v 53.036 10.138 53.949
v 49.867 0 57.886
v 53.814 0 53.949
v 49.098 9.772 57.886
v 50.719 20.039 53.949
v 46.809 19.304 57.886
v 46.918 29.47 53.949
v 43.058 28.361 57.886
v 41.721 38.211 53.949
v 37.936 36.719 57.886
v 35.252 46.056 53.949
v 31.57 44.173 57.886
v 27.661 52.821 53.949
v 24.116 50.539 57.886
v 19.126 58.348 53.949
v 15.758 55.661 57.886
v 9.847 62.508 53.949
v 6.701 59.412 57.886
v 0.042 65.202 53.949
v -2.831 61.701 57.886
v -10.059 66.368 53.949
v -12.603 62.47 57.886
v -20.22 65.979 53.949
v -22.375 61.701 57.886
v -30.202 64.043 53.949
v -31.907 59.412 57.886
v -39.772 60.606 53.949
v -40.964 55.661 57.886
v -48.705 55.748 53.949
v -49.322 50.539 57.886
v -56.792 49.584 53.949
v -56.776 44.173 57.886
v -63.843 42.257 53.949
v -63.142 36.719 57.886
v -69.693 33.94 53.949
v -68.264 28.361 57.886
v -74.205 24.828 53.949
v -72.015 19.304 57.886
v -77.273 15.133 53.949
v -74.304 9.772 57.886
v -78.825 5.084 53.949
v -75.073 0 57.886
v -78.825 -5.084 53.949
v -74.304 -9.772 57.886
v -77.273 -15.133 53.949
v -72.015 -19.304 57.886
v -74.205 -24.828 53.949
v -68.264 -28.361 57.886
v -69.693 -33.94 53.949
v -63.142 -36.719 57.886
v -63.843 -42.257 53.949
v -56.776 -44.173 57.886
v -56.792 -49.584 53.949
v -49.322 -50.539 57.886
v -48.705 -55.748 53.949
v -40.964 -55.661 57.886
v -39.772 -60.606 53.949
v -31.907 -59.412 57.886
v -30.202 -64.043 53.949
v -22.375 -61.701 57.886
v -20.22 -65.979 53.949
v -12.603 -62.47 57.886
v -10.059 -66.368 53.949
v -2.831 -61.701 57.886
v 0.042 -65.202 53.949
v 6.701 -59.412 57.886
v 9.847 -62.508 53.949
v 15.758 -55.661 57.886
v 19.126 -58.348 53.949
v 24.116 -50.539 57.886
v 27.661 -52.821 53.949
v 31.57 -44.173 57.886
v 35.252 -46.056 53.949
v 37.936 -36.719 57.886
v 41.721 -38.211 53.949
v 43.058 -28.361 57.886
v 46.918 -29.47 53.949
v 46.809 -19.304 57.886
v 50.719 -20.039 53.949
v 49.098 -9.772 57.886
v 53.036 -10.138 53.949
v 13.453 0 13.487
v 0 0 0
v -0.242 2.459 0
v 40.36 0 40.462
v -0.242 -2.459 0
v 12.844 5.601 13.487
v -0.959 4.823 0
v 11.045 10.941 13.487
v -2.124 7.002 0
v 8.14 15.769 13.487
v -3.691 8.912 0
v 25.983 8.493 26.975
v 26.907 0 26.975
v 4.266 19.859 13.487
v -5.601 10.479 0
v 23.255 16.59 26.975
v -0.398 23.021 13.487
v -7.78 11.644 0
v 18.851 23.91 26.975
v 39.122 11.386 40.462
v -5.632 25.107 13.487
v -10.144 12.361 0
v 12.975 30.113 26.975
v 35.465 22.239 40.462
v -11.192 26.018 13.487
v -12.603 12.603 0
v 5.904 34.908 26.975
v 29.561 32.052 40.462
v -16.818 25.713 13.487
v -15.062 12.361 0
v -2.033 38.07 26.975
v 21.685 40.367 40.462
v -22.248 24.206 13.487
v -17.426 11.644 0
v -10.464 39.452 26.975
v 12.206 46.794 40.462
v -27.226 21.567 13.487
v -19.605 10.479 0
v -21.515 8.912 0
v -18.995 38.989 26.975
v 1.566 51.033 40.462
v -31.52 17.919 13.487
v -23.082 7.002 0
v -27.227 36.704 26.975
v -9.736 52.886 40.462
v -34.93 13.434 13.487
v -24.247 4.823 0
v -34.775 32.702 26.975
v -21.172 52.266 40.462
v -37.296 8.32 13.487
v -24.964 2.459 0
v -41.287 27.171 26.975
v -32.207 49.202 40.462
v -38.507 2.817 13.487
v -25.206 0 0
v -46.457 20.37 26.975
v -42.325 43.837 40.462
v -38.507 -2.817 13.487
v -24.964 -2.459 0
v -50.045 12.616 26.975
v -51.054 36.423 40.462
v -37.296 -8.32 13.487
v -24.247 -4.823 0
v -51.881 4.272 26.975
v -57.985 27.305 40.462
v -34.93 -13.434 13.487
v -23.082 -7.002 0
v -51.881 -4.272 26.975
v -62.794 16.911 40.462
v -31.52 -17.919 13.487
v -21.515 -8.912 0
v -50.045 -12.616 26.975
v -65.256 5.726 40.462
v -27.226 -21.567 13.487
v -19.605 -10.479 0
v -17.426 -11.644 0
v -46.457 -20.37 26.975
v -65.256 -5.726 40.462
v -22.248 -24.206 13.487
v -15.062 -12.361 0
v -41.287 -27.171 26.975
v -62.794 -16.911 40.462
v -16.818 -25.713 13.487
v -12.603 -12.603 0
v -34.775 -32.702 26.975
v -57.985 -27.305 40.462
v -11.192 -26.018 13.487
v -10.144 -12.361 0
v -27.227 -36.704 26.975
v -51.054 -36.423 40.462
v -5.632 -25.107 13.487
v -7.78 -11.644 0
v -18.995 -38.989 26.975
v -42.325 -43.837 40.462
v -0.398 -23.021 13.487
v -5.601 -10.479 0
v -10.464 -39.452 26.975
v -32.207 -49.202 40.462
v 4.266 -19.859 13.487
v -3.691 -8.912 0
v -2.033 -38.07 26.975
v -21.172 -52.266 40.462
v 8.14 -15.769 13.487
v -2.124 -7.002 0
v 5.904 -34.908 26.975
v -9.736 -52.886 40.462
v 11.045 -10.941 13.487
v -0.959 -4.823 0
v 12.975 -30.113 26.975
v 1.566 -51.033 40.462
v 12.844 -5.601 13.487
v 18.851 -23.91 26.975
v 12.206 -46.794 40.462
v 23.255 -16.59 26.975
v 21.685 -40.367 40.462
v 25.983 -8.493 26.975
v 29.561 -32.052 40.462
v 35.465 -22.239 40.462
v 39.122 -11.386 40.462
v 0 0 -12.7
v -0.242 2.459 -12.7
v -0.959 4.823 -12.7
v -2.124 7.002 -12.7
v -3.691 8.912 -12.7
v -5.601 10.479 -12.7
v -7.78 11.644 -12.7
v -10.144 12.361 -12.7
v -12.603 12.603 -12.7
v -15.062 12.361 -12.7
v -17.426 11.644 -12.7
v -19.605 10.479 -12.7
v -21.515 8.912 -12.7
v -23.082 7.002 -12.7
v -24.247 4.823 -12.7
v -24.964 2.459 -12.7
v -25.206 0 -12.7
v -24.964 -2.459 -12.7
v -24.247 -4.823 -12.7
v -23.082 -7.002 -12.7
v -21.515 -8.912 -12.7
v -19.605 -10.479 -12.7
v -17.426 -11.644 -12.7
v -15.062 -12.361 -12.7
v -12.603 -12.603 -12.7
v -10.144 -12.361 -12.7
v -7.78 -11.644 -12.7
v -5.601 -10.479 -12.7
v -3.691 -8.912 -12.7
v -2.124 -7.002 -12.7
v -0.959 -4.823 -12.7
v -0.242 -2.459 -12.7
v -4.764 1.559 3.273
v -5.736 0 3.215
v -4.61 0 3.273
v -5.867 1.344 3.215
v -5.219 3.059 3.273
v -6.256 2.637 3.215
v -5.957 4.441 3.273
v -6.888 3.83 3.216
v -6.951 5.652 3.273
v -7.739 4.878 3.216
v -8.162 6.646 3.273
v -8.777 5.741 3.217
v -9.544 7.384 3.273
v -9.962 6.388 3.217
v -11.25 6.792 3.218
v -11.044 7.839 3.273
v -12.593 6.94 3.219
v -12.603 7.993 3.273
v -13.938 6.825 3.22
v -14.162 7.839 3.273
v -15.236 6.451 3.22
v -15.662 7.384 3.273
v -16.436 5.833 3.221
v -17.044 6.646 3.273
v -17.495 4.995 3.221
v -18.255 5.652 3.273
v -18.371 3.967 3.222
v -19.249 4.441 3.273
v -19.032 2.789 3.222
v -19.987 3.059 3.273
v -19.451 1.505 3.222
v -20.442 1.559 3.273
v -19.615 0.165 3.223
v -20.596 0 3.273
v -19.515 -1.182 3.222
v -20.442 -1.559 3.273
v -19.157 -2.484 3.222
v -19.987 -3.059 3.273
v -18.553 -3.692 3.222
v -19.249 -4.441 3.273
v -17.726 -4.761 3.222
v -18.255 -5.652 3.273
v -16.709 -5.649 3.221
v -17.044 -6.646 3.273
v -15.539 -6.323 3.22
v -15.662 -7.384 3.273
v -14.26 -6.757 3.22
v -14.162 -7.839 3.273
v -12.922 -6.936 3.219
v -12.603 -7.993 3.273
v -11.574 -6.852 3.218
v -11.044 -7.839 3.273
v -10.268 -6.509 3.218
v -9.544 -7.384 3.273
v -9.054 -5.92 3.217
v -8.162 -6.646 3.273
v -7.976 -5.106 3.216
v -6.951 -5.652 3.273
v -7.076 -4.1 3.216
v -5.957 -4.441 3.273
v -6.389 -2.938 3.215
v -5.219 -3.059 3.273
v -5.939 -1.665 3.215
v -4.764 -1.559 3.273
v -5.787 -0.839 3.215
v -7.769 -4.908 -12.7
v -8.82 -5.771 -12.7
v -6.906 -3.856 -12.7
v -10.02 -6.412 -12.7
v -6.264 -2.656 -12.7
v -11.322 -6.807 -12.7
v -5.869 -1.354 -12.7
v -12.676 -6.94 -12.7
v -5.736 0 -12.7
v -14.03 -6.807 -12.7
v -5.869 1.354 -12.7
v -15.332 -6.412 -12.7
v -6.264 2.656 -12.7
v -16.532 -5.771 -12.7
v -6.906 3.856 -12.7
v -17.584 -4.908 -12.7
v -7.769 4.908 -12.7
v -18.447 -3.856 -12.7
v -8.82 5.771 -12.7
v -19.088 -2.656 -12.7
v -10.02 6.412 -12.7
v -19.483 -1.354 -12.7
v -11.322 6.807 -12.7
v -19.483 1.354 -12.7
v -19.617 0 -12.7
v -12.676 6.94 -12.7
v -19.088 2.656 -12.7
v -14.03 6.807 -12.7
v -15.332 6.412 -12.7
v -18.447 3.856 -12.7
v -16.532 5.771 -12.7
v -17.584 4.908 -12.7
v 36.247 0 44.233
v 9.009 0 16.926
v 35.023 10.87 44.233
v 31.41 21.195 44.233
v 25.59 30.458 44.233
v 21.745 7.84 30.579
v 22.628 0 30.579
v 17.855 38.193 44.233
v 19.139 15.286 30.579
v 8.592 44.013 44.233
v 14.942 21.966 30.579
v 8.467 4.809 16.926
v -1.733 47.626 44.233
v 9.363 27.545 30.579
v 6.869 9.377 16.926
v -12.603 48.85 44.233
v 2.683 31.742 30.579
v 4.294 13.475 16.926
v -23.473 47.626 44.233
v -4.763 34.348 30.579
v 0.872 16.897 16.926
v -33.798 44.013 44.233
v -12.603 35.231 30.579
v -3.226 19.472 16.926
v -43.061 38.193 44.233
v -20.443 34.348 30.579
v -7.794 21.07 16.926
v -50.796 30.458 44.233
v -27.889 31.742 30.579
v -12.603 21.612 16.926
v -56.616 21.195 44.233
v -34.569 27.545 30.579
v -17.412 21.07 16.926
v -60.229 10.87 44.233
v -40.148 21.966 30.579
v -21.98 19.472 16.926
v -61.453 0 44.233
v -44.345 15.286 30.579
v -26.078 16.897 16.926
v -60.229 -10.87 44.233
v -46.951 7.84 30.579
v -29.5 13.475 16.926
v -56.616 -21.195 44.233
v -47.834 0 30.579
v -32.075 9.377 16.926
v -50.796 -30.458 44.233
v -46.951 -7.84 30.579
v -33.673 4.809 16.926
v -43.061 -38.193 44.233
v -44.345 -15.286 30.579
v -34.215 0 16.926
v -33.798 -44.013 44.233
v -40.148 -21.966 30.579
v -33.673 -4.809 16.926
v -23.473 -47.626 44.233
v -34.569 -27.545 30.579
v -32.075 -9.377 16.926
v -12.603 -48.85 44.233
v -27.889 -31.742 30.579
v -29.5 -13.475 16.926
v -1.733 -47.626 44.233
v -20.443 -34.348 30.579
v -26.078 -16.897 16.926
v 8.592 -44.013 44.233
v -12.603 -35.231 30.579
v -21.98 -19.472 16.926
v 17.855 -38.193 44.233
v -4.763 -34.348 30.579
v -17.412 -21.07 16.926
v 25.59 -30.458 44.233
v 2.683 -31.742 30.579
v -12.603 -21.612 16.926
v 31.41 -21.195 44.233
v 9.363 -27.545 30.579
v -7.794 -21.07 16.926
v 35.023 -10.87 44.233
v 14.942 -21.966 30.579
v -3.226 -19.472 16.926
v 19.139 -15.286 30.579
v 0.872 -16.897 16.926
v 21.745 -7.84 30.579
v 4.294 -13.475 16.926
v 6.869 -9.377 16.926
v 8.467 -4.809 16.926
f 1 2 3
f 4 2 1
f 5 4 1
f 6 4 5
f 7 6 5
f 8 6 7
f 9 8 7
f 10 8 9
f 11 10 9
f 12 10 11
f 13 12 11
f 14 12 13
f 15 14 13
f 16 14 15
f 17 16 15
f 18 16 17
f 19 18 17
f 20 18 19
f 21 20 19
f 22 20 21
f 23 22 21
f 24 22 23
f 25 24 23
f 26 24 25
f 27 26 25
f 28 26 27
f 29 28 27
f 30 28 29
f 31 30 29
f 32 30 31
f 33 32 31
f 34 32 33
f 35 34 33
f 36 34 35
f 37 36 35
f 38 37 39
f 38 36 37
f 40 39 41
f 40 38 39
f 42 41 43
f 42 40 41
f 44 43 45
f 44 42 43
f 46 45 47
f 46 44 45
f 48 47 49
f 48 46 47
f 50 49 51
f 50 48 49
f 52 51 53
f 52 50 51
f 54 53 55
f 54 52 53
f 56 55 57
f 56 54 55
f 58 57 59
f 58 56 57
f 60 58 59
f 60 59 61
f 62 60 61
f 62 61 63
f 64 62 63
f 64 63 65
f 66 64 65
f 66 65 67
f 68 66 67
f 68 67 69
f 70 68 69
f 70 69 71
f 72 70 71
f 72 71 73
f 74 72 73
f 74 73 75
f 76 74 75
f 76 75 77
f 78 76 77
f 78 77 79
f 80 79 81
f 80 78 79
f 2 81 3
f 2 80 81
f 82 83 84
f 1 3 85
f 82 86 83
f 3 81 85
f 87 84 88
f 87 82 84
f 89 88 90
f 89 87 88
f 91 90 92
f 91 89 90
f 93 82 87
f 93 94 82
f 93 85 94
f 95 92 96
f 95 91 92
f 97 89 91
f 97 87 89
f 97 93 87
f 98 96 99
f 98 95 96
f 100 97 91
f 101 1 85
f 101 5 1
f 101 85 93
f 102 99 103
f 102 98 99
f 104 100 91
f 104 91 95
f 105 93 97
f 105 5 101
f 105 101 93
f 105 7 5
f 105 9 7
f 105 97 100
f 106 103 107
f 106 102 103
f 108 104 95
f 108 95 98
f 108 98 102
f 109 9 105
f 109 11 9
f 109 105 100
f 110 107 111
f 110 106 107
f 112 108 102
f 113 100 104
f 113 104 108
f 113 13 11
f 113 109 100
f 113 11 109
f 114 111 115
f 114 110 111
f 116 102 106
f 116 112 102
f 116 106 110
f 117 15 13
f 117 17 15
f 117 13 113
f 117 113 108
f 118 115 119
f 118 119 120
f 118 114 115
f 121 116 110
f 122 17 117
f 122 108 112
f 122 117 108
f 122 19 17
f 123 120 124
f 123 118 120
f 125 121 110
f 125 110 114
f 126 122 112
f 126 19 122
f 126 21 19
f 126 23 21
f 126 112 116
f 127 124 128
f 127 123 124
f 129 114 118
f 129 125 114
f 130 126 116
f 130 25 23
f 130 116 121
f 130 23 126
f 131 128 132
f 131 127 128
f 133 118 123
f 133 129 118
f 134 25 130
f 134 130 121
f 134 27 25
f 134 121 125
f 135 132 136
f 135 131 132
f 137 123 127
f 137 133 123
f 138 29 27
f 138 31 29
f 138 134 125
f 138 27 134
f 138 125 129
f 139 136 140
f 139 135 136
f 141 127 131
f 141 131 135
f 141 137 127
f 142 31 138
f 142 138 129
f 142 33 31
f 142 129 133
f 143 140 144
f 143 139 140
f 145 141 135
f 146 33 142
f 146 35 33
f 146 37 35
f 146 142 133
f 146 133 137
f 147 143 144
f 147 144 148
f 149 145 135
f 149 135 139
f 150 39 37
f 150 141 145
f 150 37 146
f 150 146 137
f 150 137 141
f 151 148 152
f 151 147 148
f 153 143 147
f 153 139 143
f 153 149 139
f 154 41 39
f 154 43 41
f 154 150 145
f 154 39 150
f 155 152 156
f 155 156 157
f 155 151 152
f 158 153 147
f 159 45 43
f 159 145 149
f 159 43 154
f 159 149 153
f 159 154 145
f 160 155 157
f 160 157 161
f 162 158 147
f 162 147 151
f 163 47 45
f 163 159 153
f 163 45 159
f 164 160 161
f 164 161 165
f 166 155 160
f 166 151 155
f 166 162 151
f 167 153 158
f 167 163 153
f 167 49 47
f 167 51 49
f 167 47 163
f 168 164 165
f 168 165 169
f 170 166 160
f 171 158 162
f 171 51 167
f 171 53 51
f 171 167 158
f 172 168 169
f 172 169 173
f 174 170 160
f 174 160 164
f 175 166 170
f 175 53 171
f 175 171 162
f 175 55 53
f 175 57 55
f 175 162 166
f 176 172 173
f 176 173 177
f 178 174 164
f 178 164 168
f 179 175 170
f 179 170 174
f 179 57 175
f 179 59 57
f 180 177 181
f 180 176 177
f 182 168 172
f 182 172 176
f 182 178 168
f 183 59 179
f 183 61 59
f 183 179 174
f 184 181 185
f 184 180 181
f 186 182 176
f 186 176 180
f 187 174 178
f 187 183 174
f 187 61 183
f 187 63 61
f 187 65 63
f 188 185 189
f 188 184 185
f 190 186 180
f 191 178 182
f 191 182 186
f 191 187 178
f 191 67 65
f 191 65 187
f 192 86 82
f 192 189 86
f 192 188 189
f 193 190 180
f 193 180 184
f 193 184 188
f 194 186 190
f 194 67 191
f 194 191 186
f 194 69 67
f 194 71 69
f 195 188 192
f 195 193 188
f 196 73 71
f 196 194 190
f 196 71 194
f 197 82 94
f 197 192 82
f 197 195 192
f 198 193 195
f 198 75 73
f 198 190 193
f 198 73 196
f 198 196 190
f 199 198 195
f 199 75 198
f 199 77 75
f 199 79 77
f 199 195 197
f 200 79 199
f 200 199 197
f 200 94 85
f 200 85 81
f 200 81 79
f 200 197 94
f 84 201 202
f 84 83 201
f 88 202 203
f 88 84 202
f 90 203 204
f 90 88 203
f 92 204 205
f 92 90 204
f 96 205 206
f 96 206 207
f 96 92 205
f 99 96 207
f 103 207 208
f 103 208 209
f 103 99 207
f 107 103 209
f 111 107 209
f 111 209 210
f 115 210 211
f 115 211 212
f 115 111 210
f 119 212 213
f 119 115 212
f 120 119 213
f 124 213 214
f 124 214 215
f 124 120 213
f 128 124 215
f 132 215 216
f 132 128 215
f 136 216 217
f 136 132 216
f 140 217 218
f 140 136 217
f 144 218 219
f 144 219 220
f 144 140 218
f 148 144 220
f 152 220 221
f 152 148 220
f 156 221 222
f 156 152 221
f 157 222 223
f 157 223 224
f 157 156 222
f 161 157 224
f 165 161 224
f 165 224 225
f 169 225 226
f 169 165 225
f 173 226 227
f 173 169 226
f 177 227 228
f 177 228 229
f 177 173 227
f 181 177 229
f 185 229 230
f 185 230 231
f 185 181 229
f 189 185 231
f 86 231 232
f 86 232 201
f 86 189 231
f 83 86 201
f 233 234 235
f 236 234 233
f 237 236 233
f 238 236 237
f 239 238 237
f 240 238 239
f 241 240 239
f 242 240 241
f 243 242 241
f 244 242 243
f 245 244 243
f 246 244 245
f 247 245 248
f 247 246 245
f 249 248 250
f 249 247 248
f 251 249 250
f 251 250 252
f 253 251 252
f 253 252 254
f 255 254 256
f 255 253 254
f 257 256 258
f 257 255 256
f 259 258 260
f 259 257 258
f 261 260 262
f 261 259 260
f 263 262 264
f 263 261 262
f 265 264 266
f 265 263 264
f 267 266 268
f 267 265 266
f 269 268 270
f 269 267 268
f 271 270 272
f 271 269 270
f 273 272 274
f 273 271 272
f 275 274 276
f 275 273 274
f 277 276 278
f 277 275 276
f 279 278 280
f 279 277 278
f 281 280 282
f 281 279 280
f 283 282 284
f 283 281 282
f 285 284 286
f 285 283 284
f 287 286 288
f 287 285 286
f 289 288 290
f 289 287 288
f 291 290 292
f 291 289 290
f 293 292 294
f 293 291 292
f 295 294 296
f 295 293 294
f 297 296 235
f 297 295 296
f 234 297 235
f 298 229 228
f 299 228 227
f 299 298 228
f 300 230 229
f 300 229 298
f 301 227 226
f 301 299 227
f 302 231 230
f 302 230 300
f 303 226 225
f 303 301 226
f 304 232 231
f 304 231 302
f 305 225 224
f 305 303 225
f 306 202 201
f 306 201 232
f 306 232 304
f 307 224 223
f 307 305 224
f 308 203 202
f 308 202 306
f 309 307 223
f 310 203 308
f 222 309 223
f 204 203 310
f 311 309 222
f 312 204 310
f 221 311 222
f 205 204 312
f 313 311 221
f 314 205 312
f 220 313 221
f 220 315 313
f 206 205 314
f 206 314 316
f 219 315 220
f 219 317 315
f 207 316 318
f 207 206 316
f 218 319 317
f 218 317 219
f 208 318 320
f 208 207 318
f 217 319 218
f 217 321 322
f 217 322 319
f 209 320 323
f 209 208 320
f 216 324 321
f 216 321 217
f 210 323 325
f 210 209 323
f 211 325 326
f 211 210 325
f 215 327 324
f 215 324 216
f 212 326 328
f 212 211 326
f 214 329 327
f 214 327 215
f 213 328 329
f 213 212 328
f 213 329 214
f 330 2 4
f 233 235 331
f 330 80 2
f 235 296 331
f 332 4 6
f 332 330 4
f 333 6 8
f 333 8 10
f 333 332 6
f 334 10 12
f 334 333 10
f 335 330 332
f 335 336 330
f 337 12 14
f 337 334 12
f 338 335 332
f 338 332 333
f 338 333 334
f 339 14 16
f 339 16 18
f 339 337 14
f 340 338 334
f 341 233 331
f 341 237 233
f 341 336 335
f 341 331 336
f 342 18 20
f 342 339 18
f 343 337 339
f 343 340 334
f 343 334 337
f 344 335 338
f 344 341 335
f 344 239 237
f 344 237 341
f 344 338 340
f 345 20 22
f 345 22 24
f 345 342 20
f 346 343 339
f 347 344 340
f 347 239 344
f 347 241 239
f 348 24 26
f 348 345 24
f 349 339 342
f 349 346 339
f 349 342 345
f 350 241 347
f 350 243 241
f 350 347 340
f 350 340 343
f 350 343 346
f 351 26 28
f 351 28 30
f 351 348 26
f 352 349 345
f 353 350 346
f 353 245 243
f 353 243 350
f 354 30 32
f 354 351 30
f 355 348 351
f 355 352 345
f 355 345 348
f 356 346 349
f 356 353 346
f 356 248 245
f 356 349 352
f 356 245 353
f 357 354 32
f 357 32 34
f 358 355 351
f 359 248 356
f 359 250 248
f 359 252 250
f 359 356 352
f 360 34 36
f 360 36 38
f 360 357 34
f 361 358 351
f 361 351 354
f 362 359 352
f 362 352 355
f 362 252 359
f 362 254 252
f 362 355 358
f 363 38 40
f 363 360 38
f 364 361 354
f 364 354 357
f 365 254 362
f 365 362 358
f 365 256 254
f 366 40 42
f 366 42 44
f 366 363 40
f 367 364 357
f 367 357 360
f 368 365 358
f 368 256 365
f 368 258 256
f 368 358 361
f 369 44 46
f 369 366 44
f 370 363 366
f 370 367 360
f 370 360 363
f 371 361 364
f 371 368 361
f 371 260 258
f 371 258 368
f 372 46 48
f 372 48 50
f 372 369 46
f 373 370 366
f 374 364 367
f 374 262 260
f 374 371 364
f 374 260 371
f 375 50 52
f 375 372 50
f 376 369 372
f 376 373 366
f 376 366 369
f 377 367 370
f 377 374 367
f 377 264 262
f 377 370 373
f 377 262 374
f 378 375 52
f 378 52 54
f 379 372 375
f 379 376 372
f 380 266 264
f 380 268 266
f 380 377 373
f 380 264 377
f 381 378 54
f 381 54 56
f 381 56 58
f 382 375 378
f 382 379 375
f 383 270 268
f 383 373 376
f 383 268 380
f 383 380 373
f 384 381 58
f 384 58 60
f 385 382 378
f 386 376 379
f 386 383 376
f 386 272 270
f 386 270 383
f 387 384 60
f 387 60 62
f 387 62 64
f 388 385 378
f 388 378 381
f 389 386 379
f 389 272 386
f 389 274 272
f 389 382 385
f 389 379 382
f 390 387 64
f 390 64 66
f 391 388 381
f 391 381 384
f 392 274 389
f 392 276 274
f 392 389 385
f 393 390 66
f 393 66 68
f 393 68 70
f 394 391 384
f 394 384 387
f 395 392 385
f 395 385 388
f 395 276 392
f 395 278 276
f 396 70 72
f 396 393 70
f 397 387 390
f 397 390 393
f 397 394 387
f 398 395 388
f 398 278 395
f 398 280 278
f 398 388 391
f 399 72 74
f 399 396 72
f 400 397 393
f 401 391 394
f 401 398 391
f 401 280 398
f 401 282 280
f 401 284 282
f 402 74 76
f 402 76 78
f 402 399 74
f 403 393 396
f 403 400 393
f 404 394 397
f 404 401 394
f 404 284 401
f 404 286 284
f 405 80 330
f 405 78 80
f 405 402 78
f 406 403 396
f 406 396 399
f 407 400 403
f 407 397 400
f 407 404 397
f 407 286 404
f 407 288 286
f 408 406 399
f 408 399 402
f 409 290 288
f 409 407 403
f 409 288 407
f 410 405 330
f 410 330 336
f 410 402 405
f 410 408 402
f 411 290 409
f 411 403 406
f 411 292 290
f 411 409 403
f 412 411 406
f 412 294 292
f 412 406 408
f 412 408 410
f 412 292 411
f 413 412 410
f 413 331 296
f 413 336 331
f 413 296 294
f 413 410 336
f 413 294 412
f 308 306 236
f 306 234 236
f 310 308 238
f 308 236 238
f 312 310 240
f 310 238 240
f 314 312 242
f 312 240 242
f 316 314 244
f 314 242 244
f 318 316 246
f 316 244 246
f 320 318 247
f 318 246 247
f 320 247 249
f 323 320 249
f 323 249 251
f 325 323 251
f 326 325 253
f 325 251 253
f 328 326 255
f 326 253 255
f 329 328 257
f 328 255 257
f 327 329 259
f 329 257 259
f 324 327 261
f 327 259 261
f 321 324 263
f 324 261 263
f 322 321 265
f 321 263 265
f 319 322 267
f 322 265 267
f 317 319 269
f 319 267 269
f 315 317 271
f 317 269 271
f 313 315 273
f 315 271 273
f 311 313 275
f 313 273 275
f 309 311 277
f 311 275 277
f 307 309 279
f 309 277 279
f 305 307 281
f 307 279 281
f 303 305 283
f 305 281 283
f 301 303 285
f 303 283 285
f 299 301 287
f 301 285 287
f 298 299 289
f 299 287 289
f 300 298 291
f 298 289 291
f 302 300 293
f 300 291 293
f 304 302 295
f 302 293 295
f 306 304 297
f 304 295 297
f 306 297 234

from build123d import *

# Parameters (mm, degrees)
F2_R     = 6.940355
F3_DEPTH = 279.4
F4_DEPTH = 25.4


with BuildPart() as f1:
    # F0 (on Front) → F1 (revolve)
    with BuildSketch(Plane.XZ):
        Polygon((0, -12.7), (0, 0), (53.81389, 53.949098), (49.866706, 57.886391), (-4.610259, 3.272552), (-12.603007, 2.86432), (-12.603007, -12.7), align=None)
    revolve(axis=Axis((-12.603007, 0, -4.91784), (0, 0, 1)))

    # F2 (on Top) → F3 (cut)
    with BuildSketch(Plane.XY):
        with Locations((-12.676277, 0)):
            Circle(F2_R)
    extrude(amount=-F3_DEPTH, mode=Mode.SUBTRACT)

    # F2 (on Top) → F4 (cut)
    with BuildSketch(Plane.XY):
        with Locations((-12.676277, 0)):
            Circle(F2_R)
    extrude(amount=F4_DEPTH, mode=Mode.SUBTRACT)


solid = f1.part
